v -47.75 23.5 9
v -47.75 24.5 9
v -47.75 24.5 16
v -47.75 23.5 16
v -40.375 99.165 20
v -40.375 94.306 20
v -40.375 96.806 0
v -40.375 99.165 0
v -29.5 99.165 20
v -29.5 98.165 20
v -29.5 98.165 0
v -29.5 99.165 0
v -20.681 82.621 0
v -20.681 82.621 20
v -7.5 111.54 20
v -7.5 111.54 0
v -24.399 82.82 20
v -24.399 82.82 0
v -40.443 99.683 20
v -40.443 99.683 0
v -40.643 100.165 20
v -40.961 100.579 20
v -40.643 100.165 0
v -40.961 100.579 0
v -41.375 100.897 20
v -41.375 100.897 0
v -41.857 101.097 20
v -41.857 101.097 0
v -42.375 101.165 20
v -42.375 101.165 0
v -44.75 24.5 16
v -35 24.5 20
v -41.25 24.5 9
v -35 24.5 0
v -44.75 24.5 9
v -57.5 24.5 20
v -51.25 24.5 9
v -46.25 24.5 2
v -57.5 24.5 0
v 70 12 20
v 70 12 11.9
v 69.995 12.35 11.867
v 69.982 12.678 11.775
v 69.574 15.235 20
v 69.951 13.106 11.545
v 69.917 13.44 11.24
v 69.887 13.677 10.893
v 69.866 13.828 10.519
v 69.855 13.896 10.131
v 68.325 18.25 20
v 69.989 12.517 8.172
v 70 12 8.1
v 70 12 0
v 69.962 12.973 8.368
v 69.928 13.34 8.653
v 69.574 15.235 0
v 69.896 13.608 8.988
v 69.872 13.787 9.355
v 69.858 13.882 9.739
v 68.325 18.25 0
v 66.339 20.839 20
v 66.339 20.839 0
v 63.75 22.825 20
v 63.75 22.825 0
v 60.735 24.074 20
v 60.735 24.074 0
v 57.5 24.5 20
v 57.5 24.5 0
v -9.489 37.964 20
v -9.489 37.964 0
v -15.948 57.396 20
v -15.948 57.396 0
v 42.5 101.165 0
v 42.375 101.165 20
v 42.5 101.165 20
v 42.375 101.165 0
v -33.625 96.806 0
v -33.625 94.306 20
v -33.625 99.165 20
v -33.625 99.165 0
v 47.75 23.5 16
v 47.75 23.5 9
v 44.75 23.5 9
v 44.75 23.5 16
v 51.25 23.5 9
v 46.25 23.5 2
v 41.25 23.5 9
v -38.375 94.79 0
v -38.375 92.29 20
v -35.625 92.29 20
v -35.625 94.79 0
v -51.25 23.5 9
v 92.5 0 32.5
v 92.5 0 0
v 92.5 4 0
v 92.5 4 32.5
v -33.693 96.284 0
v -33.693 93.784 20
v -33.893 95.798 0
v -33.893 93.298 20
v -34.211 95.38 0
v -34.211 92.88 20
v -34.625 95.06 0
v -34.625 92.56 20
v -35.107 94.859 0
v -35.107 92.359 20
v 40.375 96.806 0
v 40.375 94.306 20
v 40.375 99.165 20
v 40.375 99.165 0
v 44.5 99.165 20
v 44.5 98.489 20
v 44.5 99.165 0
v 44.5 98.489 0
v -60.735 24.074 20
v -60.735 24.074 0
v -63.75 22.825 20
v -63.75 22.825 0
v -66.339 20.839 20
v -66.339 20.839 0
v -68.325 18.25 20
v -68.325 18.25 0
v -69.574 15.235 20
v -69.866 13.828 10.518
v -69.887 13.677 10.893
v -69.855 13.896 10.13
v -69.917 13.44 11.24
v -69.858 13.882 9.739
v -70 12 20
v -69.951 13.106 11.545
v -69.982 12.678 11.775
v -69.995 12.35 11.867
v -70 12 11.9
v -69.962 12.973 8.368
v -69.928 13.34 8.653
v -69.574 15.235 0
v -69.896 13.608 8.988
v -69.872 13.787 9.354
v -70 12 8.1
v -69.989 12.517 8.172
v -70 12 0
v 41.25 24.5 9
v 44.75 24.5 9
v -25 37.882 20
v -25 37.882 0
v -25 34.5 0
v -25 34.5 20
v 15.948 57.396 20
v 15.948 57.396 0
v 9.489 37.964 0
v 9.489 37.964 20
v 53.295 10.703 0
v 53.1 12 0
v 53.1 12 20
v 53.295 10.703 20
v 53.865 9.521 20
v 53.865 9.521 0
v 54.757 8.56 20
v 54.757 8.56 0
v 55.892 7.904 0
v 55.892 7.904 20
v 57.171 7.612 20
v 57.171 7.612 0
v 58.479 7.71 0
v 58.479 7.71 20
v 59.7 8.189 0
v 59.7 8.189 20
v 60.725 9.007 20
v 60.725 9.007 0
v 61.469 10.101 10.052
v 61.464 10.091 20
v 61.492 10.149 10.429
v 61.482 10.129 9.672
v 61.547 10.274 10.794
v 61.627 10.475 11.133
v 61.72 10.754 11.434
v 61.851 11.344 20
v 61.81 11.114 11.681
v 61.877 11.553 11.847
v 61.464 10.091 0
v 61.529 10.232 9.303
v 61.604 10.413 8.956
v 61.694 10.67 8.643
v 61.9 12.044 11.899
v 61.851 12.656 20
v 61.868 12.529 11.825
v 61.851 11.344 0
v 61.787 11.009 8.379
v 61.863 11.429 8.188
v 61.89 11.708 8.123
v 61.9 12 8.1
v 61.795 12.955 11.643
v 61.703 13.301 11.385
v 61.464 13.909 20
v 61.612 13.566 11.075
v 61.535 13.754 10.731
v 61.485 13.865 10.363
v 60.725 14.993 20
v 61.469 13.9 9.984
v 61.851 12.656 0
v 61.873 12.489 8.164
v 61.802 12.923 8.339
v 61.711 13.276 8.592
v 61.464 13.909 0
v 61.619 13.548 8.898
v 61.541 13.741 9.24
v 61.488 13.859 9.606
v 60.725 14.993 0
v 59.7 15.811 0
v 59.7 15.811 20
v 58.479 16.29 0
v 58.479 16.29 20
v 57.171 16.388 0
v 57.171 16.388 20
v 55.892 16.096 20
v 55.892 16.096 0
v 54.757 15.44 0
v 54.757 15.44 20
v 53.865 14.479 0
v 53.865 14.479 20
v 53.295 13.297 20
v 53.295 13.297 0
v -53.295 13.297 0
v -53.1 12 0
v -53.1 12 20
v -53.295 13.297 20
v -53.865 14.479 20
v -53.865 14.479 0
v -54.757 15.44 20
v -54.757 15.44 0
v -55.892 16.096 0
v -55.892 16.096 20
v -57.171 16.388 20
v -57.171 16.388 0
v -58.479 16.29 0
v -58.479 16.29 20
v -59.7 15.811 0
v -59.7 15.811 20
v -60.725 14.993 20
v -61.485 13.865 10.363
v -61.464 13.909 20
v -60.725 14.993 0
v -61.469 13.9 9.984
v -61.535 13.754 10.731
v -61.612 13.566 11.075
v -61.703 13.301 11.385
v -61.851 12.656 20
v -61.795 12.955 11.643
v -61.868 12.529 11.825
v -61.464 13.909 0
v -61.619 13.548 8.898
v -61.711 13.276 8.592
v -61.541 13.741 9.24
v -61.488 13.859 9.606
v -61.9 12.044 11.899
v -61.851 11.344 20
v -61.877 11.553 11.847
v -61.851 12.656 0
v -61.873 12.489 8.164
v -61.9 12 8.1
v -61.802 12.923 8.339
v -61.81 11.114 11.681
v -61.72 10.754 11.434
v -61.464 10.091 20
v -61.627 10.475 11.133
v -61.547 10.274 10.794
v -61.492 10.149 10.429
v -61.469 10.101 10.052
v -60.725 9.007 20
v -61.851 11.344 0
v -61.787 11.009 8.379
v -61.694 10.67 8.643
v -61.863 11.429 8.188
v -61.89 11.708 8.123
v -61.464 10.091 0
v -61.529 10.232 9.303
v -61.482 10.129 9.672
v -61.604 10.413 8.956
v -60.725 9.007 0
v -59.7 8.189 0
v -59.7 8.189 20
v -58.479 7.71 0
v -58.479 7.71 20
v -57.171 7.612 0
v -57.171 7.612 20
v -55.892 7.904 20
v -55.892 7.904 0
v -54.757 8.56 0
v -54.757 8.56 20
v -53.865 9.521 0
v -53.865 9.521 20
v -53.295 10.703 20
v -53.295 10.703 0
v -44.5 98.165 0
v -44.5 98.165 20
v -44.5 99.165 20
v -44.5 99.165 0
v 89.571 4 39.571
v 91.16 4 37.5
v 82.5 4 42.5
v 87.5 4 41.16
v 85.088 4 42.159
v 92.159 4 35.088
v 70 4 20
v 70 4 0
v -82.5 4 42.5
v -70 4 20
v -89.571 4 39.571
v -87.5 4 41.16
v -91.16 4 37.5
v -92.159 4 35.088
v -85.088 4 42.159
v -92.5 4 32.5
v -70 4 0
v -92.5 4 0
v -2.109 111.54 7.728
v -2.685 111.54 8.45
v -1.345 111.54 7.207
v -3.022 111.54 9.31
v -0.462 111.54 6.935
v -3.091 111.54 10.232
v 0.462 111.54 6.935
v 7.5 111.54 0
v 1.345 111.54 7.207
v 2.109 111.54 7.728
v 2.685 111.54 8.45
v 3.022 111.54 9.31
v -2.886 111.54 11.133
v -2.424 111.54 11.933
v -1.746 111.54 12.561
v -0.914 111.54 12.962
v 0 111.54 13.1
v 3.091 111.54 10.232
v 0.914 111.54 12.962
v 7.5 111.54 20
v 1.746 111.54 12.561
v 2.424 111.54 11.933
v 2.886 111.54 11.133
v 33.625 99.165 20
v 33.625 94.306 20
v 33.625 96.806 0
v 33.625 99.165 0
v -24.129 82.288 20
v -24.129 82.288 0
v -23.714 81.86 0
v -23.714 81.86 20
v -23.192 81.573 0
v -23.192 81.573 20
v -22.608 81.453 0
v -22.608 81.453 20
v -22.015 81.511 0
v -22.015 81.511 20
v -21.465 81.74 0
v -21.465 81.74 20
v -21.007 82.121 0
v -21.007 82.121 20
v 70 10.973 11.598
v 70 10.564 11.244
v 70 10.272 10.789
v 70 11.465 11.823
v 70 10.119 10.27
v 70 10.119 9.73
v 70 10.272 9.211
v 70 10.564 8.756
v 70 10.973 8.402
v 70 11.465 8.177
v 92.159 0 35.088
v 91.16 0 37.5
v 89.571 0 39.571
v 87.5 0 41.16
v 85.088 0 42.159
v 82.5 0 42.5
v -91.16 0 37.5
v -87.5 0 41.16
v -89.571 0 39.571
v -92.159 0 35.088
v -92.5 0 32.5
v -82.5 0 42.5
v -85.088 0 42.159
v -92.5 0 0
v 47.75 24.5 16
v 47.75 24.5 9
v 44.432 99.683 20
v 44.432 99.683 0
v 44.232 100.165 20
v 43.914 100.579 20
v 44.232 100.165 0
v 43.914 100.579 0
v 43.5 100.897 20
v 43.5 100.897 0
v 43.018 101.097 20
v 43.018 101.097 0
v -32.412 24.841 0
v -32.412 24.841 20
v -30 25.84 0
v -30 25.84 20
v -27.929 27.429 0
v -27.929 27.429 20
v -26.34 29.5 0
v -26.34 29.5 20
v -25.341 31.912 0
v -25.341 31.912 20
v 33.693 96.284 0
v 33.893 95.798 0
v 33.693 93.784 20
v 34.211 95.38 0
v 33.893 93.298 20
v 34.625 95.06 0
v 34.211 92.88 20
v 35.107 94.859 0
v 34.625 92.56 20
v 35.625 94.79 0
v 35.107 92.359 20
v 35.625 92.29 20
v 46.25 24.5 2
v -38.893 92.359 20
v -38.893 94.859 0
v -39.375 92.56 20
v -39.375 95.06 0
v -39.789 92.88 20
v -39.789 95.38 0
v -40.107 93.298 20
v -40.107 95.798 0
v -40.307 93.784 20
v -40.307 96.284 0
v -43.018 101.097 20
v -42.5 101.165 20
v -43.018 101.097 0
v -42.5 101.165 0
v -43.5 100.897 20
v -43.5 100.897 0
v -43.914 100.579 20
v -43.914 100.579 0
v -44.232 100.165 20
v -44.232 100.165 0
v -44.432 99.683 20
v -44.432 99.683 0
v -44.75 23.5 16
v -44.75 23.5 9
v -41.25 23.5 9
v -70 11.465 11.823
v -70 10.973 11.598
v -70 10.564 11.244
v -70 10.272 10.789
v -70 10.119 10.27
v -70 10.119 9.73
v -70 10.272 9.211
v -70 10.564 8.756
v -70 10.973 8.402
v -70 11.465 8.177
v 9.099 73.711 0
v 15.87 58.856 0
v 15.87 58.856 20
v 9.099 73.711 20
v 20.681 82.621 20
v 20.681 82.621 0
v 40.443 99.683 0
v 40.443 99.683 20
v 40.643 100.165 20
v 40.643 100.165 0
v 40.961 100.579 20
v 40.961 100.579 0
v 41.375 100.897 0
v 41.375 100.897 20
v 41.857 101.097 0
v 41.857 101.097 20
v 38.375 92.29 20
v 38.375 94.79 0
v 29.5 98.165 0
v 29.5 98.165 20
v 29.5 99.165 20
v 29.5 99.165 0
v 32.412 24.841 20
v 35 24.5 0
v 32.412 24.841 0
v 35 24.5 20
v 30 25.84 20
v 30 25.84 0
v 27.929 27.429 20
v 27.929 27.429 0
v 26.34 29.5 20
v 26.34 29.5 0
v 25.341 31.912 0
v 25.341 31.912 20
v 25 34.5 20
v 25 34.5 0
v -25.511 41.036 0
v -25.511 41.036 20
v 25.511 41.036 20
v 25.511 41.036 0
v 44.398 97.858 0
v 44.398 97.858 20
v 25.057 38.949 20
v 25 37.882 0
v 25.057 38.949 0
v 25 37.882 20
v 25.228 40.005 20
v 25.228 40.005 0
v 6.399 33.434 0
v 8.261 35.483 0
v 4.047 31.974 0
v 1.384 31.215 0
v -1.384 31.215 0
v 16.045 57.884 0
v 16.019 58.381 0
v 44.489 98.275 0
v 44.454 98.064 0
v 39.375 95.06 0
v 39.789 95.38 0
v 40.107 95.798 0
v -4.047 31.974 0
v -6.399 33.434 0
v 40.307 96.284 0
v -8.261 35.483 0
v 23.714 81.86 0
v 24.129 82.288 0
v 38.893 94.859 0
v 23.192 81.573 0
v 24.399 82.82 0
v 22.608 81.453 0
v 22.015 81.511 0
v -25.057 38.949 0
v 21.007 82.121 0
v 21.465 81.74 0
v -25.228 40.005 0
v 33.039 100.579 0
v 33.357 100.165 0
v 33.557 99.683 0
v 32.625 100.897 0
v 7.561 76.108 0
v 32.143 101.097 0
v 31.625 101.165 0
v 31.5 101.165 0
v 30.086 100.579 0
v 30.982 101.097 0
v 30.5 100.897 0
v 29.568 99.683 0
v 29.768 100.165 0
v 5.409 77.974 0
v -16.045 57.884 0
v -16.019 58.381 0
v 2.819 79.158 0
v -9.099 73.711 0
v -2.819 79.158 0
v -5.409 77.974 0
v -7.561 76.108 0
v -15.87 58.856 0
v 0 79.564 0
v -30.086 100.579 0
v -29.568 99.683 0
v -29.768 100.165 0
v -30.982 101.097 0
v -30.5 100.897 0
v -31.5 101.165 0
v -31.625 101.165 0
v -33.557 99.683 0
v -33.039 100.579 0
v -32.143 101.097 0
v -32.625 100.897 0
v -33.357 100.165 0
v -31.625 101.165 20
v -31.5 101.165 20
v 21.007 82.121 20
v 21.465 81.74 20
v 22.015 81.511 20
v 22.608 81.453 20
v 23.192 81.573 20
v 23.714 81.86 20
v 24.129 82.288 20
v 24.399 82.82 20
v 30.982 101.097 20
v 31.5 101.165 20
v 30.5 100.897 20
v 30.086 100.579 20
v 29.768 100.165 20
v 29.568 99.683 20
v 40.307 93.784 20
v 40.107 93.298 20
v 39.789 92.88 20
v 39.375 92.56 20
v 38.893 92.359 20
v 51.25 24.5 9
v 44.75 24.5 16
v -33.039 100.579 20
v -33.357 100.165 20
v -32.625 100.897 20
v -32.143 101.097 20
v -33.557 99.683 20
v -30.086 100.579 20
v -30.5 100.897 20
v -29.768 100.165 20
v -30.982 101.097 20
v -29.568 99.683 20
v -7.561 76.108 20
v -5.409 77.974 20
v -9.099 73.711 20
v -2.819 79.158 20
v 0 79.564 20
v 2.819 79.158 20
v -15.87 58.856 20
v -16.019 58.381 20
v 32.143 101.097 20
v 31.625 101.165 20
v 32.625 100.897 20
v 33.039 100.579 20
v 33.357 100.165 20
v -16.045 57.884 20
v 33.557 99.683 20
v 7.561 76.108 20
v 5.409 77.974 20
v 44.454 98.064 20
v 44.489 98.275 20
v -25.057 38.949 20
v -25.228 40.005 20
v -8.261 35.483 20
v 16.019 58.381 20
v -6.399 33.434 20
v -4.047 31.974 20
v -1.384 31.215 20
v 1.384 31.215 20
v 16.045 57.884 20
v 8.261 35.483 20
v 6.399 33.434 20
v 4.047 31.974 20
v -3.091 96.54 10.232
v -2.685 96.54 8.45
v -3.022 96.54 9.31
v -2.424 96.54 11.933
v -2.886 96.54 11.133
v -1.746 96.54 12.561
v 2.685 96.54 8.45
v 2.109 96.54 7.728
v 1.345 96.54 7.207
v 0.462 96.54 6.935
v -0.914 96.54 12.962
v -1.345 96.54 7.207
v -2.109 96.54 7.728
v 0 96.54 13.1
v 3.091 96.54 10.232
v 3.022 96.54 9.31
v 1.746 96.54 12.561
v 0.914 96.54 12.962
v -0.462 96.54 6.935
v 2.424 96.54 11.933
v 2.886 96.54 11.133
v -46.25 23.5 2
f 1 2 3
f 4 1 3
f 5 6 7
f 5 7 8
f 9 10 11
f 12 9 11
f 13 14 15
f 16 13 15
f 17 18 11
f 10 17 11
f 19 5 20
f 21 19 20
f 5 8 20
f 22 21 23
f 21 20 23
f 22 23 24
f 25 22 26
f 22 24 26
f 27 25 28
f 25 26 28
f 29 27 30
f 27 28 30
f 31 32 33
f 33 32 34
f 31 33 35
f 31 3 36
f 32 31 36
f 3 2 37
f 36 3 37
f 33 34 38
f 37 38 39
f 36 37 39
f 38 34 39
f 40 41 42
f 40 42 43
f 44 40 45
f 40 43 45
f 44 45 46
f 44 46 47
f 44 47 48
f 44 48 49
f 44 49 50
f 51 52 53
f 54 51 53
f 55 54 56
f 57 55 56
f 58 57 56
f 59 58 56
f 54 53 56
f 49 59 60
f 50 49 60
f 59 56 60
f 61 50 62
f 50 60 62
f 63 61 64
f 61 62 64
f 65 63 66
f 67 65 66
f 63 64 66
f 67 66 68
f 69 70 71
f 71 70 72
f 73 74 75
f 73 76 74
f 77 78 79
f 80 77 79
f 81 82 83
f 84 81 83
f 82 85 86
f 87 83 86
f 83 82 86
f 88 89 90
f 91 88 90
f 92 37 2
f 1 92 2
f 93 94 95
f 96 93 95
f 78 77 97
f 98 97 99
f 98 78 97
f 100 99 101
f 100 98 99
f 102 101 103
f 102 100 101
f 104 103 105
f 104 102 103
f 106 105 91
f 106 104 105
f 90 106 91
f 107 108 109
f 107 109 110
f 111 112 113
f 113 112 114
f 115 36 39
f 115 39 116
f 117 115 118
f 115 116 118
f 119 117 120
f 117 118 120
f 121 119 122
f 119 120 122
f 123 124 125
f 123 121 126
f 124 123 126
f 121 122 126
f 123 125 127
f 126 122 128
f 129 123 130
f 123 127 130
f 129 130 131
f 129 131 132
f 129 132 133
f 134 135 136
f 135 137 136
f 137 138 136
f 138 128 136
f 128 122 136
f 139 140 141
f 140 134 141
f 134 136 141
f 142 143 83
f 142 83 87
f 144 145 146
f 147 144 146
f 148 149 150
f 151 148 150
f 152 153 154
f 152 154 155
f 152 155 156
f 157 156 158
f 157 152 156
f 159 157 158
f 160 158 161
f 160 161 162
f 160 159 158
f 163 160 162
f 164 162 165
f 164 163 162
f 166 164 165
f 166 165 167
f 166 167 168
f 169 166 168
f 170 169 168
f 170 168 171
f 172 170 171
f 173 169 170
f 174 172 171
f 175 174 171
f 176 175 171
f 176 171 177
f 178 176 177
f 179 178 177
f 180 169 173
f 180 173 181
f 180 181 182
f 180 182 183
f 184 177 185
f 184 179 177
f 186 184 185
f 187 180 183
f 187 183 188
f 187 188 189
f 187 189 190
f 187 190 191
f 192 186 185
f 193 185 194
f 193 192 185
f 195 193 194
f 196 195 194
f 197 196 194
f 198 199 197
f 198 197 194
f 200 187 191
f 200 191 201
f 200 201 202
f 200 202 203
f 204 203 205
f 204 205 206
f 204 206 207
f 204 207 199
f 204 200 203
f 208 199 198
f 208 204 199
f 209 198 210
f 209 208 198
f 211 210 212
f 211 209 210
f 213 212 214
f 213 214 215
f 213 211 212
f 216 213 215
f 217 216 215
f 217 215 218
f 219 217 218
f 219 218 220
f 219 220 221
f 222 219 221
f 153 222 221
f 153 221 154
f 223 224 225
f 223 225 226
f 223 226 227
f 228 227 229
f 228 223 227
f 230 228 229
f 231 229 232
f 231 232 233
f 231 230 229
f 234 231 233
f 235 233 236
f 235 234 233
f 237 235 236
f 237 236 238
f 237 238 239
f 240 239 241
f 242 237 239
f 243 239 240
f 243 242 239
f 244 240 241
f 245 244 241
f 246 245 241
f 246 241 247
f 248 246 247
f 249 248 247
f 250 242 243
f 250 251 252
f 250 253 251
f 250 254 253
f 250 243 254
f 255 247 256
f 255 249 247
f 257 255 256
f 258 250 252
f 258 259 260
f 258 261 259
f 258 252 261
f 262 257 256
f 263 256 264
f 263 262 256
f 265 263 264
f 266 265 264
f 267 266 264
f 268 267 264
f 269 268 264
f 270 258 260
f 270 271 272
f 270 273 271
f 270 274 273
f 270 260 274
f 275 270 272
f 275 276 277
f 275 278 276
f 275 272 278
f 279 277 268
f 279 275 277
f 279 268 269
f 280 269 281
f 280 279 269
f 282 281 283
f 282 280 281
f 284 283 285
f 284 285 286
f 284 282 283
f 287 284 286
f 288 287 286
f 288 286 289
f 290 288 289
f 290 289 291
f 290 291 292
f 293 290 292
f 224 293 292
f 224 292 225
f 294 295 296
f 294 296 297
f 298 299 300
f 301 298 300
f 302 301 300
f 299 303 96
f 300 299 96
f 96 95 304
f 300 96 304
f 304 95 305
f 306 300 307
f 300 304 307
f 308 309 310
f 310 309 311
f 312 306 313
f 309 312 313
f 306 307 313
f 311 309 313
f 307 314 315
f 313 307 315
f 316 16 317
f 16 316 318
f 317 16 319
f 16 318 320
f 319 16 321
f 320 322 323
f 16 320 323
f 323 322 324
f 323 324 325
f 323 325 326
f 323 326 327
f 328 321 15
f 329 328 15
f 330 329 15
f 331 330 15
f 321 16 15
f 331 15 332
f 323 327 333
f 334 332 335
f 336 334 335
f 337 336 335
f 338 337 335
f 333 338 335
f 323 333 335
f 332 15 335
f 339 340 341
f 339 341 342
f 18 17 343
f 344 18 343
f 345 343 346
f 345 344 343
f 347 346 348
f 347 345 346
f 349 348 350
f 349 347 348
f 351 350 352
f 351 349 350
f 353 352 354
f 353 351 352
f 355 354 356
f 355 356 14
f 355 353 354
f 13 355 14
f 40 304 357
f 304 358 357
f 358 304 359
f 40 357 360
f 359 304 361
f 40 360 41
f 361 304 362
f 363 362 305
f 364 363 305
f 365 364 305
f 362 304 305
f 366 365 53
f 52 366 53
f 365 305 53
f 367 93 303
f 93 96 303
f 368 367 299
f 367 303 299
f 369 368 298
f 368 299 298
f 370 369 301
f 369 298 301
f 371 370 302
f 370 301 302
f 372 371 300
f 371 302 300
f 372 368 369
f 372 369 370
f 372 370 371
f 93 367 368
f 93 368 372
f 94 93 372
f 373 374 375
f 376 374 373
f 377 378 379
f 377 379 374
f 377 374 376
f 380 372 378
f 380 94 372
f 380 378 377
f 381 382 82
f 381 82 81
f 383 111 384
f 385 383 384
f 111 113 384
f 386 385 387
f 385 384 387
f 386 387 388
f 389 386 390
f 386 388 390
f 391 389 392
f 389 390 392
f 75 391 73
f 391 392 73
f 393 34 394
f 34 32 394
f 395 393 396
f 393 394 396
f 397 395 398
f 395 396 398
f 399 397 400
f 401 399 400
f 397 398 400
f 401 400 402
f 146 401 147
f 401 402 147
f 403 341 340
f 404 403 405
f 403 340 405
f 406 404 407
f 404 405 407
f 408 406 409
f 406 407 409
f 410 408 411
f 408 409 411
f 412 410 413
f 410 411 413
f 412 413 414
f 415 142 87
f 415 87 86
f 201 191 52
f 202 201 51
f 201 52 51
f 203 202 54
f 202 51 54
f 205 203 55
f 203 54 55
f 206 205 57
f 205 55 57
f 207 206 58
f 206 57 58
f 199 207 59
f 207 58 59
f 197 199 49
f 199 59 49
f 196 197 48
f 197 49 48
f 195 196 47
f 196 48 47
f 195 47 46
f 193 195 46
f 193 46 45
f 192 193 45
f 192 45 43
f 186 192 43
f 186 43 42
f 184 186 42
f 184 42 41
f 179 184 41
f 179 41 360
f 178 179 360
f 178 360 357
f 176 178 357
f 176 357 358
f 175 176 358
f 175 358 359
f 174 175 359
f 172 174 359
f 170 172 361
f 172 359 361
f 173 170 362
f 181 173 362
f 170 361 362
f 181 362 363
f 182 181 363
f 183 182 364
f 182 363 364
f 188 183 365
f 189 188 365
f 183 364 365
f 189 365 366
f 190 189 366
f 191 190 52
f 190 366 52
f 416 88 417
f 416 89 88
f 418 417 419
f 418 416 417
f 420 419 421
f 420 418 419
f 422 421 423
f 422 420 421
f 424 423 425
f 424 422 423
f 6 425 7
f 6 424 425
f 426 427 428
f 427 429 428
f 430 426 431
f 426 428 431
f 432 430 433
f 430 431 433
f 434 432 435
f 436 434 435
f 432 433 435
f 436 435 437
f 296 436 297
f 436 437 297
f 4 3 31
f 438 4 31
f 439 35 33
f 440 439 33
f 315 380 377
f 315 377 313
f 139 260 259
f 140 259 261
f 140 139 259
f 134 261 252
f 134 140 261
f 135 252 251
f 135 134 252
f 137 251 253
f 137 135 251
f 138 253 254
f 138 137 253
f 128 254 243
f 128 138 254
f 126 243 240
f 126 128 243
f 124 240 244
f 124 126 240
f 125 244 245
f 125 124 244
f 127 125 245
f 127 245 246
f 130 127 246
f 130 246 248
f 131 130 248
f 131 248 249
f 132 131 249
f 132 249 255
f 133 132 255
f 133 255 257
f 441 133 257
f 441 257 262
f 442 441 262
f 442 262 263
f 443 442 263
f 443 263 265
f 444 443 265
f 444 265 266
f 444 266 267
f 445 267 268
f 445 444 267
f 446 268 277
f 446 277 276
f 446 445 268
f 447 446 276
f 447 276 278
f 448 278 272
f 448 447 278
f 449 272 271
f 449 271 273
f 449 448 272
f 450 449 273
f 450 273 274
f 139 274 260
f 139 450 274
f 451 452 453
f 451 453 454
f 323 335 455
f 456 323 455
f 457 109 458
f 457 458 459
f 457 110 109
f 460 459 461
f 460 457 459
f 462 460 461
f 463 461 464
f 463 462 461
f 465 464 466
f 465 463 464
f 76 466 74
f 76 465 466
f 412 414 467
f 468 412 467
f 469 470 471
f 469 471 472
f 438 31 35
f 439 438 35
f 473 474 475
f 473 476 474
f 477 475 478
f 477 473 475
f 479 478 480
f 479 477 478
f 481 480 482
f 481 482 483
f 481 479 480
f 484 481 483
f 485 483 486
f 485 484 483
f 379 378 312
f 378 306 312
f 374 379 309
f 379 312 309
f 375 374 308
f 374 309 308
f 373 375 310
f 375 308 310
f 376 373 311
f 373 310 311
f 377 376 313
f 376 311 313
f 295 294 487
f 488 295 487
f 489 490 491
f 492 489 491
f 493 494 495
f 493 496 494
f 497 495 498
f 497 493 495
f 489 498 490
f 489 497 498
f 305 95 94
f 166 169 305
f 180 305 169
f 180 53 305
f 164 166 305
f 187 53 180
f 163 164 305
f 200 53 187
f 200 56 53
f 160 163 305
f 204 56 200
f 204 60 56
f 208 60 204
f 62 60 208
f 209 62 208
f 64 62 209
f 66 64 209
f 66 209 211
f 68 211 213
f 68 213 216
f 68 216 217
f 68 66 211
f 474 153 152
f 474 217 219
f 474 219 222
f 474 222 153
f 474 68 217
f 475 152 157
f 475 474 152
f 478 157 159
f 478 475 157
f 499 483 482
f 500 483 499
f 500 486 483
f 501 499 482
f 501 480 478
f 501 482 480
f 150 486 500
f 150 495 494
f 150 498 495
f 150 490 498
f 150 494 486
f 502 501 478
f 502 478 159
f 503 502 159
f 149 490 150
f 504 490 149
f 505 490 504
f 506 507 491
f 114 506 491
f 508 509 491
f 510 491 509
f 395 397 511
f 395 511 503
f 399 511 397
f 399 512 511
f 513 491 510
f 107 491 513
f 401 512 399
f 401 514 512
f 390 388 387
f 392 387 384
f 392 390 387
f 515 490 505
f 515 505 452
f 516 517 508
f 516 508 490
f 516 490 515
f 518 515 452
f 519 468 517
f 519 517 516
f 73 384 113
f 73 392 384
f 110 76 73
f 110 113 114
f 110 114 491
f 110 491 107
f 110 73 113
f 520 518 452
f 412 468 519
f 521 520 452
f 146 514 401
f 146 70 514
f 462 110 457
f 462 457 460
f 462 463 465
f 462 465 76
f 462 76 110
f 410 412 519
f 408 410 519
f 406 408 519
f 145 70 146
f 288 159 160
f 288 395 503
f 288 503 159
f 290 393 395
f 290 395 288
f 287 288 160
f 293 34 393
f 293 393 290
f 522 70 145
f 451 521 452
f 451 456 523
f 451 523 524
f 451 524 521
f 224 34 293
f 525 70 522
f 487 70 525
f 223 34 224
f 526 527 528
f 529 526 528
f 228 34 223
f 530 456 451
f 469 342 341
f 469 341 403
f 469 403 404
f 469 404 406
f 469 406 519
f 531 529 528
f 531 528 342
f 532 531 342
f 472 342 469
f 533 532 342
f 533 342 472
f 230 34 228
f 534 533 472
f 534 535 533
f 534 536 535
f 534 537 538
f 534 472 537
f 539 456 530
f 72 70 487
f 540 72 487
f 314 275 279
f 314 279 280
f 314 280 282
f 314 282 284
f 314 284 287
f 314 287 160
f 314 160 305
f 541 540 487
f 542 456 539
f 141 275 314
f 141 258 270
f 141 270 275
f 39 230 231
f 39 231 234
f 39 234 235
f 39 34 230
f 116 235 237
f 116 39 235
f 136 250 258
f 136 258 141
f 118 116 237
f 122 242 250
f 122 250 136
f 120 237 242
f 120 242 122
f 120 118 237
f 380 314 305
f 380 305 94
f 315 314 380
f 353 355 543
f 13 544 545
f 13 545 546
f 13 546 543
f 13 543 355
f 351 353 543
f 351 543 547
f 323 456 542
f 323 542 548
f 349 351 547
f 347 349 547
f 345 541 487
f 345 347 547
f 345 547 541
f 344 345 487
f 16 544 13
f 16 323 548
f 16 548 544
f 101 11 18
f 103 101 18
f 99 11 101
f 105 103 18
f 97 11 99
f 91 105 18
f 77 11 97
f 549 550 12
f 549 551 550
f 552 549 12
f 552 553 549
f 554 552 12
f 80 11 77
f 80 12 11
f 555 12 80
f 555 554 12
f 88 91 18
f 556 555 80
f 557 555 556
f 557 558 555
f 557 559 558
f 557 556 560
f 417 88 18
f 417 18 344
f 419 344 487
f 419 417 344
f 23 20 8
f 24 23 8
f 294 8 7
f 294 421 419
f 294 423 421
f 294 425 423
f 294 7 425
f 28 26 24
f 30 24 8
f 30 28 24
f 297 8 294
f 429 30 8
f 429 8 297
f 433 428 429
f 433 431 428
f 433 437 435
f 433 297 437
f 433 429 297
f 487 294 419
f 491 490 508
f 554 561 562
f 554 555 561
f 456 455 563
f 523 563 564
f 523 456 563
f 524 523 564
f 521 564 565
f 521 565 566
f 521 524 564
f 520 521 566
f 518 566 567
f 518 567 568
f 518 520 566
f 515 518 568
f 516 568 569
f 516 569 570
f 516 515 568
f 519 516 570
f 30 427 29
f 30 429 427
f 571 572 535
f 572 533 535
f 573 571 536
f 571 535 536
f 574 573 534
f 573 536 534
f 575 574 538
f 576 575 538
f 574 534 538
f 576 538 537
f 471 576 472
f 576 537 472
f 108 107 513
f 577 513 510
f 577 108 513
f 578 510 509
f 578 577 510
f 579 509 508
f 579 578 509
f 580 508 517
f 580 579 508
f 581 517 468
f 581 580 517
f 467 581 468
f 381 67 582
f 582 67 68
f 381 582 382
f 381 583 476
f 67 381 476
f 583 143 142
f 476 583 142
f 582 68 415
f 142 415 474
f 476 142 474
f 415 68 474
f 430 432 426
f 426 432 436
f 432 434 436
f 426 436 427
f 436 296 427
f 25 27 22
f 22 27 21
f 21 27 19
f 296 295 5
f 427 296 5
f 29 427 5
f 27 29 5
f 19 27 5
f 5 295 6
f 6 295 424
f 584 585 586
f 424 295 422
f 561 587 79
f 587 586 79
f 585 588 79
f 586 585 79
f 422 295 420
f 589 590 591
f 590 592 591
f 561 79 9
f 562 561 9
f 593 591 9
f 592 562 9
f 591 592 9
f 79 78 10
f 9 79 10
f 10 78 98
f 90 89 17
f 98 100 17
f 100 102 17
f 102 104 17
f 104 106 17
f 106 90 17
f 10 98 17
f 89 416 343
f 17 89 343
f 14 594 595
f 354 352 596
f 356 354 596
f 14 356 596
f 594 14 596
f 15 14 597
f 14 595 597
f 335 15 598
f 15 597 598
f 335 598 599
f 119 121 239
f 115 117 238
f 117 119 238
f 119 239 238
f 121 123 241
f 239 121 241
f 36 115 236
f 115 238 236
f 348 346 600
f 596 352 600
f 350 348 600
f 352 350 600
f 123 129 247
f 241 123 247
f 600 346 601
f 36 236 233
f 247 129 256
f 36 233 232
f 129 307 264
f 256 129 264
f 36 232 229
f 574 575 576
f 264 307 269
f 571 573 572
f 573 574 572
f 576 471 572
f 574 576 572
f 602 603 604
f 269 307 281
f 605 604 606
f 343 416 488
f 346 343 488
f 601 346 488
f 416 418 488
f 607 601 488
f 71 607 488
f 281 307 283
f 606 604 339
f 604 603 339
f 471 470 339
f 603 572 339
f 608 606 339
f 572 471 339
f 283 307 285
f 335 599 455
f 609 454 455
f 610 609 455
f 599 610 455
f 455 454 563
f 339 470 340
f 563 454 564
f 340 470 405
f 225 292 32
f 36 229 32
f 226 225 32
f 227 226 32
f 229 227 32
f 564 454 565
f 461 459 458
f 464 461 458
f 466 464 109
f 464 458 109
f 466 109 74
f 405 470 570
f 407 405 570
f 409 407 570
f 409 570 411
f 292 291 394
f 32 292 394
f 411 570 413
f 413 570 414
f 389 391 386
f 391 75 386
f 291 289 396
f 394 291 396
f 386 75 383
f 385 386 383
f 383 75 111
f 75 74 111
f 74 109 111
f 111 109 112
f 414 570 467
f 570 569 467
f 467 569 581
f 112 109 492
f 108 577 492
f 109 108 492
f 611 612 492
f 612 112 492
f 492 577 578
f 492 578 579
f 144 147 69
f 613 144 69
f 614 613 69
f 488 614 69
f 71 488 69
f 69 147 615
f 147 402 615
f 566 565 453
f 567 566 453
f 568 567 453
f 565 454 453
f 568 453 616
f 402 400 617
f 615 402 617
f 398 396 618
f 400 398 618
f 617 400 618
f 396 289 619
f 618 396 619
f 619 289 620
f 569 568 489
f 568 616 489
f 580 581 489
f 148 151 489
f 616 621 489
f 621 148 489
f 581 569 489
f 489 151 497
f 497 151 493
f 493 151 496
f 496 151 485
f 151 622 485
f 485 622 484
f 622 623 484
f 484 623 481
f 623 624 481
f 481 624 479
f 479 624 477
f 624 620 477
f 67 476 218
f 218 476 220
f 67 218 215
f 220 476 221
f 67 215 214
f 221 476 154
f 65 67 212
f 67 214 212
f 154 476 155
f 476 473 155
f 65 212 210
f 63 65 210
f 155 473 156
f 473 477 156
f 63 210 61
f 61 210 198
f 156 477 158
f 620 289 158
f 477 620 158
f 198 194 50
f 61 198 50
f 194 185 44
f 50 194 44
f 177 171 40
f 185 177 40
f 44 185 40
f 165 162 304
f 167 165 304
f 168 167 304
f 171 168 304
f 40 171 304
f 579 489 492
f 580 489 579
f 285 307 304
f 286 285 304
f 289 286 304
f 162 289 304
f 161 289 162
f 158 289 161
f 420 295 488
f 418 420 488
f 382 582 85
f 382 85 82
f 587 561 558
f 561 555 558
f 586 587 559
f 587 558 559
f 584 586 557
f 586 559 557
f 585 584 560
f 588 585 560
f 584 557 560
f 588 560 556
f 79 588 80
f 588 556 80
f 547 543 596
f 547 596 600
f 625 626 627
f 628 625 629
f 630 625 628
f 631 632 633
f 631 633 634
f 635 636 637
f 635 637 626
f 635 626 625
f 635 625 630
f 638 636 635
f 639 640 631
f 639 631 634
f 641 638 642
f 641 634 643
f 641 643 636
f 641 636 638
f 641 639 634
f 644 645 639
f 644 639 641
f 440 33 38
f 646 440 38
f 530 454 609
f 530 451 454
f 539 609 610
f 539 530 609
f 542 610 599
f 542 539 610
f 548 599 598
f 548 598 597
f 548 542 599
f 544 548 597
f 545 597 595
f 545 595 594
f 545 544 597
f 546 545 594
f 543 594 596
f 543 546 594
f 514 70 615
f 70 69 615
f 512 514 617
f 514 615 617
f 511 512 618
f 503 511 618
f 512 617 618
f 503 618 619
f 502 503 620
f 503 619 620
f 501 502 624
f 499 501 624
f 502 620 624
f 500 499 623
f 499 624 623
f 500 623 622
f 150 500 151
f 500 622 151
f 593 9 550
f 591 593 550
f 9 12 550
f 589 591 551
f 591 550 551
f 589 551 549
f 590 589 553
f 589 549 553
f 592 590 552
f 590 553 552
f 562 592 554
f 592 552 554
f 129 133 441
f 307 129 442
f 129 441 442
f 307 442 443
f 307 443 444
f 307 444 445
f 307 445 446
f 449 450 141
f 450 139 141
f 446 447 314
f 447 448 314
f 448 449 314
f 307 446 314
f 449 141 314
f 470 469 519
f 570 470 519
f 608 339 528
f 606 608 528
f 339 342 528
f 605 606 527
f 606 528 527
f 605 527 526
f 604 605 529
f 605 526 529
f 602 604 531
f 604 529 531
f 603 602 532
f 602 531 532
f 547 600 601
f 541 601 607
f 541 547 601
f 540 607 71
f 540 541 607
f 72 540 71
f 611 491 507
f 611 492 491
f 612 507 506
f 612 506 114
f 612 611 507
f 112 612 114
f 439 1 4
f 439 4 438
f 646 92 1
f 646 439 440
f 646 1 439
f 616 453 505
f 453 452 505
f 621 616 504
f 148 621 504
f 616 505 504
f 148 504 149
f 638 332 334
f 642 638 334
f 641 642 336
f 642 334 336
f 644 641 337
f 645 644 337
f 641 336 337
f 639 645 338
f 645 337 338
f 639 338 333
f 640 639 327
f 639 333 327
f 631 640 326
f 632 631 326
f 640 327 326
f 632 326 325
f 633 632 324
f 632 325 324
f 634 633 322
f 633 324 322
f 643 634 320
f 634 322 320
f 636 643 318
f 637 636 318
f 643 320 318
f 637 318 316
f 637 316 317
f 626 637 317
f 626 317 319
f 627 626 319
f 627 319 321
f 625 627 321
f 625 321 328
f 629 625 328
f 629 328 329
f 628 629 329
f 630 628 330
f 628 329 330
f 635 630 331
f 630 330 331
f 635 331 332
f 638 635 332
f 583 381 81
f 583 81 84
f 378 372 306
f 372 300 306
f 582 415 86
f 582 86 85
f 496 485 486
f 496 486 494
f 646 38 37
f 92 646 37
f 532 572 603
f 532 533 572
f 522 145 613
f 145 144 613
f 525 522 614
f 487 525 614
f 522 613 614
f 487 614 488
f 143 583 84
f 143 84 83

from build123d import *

# Parameters (mm, degrees)
SKETCH1_R           = 4.4
BOSS_EXTRUDE1_DEPTH = 20
FILLET1_R           = 10
SKETCH2_W           = 6.75
SKETCH2_H           = 6.75
CUT_EXTRUDE1_DEPTH  = 124.17331296
SKETCH3_W           = 4.125
SKETCH3_H           = 20
BOSS_EXTRUDE2_DEPTH = 3
FILLET2_R           = 2
BOSS_EXTRUDE3_DEPTH = 20
FILLET3_R           = 10
FILLET4_R           = 2
SKETCH5_R           = 3.1
CUT_EXTRUDE2_DEPTH  = 15
SKETCH6_W           = 185
SKETCH6_H           = 4
BOSS_EXTRUDE4_DEPTH = 42.5
FILLET5_R           = 10
CUT_EXTRUDE3_DEPTH  = 1
SKETCH8_R           = 1.9
CUT_EXTRUDE4_DEPTH  = 10


with BuildPart() as part:
    # Sketch1 → Boss-Extrude1 (new body)
    with BuildSketch(Plane.XY):
        with BuildLine():
            Line((-70, 0), (70, 0))
            Line((70, 0), (70, 12))
            ThreePointArc((70, 12), (66.338834765, 20.838834765), (57.5, 24.5))
            Line((57.5, 24.5), (25, 24.5))
            Line((25, 24.5), (25, 39.5))
            Line((25, 39.5), (44.5, 98.165))
            Line((44.5, 98.165), (29.5, 98.165))
            Line((29.5, 98.165), (0, 9.415384615))
            Line((0, 9.415384615), (-29.5, 98.165))
            Line((-29.5, 98.165), (-44.5, 98.165))
            Line((-44.5, 98.165), (-25, 39.5))
            Line((-25, 39.5), (-25, 24.5))
            Line((-25, 24.5), (-57.5, 24.5))
            ThreePointArc((-57.5, 24.5), (-66.338834765, 20.838834765), (-70, 12))
            Line((-70, 12), (-70, 0))
        make_face()
        with Locations((-57.5, 12)):
            Circle(SKETCH1_R, mode=Mode.SUBTRACT)
        with Locations(Location((57.5, 12, 0), (0, 0, 180))):
            Circle(SKETCH1_R, mode=Mode.SUBTRACT)
    extrude(amount=BOSS_EXTRUDE1_DEPTH)

    # Fillet1
    fillet1_edges = [part.edges().sort_by_distance(p)[0] for p in [
        (25, 39.5, 10),
        (25, 24.5, 10),
        (-25, 24.5, 10),
        (-25, 39.5, 10),
        (0, 9.415384615, 10),
    ]]
    fillet(fillet1_edges, radius=FILLET1_R)

    # Sketch2 → Cut-Extrude1 (cut, through all, along a direction that is not the sketch's normal)
    with BuildSketch(Plane.XY):
        with Locations((37, 98.165)):
            Rectangle(SKETCH2_W, SKETCH2_H)
        with Locations((-37, 98.165)):
            Rectangle(SKETCH2_W, SKETCH2_H)
    extrude(amount=CUT_EXTRUDE1_DEPTH, dir=(0, -0.12403473458920856, 0.9922778767136676), mode=Mode.SUBTRACT)

    # Sketch3 → Boss-Extrude2 (add)
    with BuildSketch(Plane(origin=(0, 98.165, 0), x_dir=(1, 0, 0), z_dir=(0, 1, 0))):
        with Locations((42.4375, -10)):
            Rectangle(SKETCH3_W, SKETCH3_H)
        with Locations((31.5625, -10)):
            Rectangle(SKETCH3_W, SKETCH3_H)
        with Locations((-31.5625, -10)):
            Rectangle(SKETCH3_W, SKETCH3_H)
        with Locations((-42.4375, -10)):
            Rectangle(SKETCH3_W, SKETCH3_H)
    extrude(amount=BOSS_EXTRUDE2_DEPTH)

    # Fillet2
    fillet2_edges = [part.edges().sort_by_distance(p)[0] for p in [
        (-40.375, 93.54, 10),
        (-33.625, 93.54, 10),
        (44.5, 101.165, 10),
        (40.375, 101.165, 10),
        (29.5, 101.165, 10),
        (33.625, 101.165, 10),
        (-29.5, 101.165, 10),
        (-33.625, 101.165, 10),
        (-44.5, 101.165, 10),
        (-40.375, 101.165, 10),
        (44.5, 98.165, 10),
        (33.625, 93.54, 10),
        (40.375, 93.54, 10),
    ]]
    fillet(fillet2_edges, radius=FILLET2_R)

    # Sketch4 → Boss-Extrude3 (add)
    with BuildSketch(Plane.XY.offset(20)):
        Polygon((-22.793222795, 77.98791873), (-7.5, 111.54), (7.5, 111.54), (22.793222795, 77.98791873), (16.196275804, 58.141257439), (0, 93.674563227), (-16.196275804, 58.141257439), align=None)
    extrude(amount=-BOSS_EXTRUDE3_DEPTH)

    # Fillet3
    fillet3_edges = [part.edges().sort_by_distance(p)[0] for p in [
        (0, 93.674563227, 10),
    ]]
    fillet(fillet3_edges, radius=FILLET3_R)

    # Fillet4
    fillet4_edges = [part.edges().sort_by_distance(p)[0] for p in [
        (16.196275804, 58.141257439, 10),
        (22.793222795, 77.98791873, 10),
        (-22.793222795, 77.98791873, 10),
        (-16.196275804, 58.141257439, 10),
    ]]
    fillet(fillet4_edges, radius=FILLET4_R)

    # Sketch5 → Cut-Extrude2 (cut)
    with BuildSketch(Plane(origin=(0, 111.54, 0), x_dir=(1, 0, 0), z_dir=(0, 1, 0))):
        with Locations(Location((0, -10, 0), (0, 0, 270))):
            Circle(SKETCH5_R)
    extrude(amount=-CUT_EXTRUDE2_DEPTH, mode=Mode.SUBTRACT)

    # Sketch6 → Boss-Extrude4 (add)
    with BuildSketch(Plane(origin=(0, 0, 0), x_dir=(-1, 0, 0), z_dir=(0, 0, -1))):
        with Locations((0, 2)):
            Rectangle(SKETCH6_W, SKETCH6_H)
    extrude(amount=-BOSS_EXTRUDE4_DEPTH)

    # Fillet5
    fillet5_edges = [part.edges().sort_by_distance(p)[0] for p in [
        (-92.5, 2, 42.5),
        (92.5, 2, 42.5),
    ]]
    fillet(fillet5_edges, radius=FILLET5_R)

    # Sketch7 → Cut-Extrude3 (cut)
    with BuildSketch(Plane(origin=(0, 24.5, 0), x_dir=(1, 0, 0), z_dir=(0, 1, 0))):
        Polygon((41.25, -9), (46.25, -2), (51.25, -9), (47.75, -9), (47.75, -16), (44.75, -16), (44.75, -9), align=None)
    cut_extrude3 = extrude(amount=-CUT_EXTRUDE3_DEPTH, mode=Mode.SUBTRACT)

    # Sketch8 → Cut-Extrude4 (cut)
    with BuildSketch(Plane(origin=(70, 0, 0), x_dir=(0, 0, -1), z_dir=(1, 0, 0))):
        with Locations((-10, 12)):
            Circle(SKETCH8_R)
    cut_extrude4 = extrude(amount=-CUT_EXTRUDE4_DEPTH, mode=Mode.SUBTRACT)

    # Mirror1: Cut-Extrude3, Cut-Extrude4 across plane
    add(cut_extrude3.mirror(Plane(origin=(0, 0, 0), x_dir=(0, 0, 1), z_dir=(1, 0, 0))), mode=Mode.SUBTRACT)
    add(cut_extrude4.mirror(Plane(origin=(0, 0, 0), x_dir=(0, 0, 1), z_dir=(1, 0, 0))), mode=Mode.SUBTRACT)


solid = part.part
